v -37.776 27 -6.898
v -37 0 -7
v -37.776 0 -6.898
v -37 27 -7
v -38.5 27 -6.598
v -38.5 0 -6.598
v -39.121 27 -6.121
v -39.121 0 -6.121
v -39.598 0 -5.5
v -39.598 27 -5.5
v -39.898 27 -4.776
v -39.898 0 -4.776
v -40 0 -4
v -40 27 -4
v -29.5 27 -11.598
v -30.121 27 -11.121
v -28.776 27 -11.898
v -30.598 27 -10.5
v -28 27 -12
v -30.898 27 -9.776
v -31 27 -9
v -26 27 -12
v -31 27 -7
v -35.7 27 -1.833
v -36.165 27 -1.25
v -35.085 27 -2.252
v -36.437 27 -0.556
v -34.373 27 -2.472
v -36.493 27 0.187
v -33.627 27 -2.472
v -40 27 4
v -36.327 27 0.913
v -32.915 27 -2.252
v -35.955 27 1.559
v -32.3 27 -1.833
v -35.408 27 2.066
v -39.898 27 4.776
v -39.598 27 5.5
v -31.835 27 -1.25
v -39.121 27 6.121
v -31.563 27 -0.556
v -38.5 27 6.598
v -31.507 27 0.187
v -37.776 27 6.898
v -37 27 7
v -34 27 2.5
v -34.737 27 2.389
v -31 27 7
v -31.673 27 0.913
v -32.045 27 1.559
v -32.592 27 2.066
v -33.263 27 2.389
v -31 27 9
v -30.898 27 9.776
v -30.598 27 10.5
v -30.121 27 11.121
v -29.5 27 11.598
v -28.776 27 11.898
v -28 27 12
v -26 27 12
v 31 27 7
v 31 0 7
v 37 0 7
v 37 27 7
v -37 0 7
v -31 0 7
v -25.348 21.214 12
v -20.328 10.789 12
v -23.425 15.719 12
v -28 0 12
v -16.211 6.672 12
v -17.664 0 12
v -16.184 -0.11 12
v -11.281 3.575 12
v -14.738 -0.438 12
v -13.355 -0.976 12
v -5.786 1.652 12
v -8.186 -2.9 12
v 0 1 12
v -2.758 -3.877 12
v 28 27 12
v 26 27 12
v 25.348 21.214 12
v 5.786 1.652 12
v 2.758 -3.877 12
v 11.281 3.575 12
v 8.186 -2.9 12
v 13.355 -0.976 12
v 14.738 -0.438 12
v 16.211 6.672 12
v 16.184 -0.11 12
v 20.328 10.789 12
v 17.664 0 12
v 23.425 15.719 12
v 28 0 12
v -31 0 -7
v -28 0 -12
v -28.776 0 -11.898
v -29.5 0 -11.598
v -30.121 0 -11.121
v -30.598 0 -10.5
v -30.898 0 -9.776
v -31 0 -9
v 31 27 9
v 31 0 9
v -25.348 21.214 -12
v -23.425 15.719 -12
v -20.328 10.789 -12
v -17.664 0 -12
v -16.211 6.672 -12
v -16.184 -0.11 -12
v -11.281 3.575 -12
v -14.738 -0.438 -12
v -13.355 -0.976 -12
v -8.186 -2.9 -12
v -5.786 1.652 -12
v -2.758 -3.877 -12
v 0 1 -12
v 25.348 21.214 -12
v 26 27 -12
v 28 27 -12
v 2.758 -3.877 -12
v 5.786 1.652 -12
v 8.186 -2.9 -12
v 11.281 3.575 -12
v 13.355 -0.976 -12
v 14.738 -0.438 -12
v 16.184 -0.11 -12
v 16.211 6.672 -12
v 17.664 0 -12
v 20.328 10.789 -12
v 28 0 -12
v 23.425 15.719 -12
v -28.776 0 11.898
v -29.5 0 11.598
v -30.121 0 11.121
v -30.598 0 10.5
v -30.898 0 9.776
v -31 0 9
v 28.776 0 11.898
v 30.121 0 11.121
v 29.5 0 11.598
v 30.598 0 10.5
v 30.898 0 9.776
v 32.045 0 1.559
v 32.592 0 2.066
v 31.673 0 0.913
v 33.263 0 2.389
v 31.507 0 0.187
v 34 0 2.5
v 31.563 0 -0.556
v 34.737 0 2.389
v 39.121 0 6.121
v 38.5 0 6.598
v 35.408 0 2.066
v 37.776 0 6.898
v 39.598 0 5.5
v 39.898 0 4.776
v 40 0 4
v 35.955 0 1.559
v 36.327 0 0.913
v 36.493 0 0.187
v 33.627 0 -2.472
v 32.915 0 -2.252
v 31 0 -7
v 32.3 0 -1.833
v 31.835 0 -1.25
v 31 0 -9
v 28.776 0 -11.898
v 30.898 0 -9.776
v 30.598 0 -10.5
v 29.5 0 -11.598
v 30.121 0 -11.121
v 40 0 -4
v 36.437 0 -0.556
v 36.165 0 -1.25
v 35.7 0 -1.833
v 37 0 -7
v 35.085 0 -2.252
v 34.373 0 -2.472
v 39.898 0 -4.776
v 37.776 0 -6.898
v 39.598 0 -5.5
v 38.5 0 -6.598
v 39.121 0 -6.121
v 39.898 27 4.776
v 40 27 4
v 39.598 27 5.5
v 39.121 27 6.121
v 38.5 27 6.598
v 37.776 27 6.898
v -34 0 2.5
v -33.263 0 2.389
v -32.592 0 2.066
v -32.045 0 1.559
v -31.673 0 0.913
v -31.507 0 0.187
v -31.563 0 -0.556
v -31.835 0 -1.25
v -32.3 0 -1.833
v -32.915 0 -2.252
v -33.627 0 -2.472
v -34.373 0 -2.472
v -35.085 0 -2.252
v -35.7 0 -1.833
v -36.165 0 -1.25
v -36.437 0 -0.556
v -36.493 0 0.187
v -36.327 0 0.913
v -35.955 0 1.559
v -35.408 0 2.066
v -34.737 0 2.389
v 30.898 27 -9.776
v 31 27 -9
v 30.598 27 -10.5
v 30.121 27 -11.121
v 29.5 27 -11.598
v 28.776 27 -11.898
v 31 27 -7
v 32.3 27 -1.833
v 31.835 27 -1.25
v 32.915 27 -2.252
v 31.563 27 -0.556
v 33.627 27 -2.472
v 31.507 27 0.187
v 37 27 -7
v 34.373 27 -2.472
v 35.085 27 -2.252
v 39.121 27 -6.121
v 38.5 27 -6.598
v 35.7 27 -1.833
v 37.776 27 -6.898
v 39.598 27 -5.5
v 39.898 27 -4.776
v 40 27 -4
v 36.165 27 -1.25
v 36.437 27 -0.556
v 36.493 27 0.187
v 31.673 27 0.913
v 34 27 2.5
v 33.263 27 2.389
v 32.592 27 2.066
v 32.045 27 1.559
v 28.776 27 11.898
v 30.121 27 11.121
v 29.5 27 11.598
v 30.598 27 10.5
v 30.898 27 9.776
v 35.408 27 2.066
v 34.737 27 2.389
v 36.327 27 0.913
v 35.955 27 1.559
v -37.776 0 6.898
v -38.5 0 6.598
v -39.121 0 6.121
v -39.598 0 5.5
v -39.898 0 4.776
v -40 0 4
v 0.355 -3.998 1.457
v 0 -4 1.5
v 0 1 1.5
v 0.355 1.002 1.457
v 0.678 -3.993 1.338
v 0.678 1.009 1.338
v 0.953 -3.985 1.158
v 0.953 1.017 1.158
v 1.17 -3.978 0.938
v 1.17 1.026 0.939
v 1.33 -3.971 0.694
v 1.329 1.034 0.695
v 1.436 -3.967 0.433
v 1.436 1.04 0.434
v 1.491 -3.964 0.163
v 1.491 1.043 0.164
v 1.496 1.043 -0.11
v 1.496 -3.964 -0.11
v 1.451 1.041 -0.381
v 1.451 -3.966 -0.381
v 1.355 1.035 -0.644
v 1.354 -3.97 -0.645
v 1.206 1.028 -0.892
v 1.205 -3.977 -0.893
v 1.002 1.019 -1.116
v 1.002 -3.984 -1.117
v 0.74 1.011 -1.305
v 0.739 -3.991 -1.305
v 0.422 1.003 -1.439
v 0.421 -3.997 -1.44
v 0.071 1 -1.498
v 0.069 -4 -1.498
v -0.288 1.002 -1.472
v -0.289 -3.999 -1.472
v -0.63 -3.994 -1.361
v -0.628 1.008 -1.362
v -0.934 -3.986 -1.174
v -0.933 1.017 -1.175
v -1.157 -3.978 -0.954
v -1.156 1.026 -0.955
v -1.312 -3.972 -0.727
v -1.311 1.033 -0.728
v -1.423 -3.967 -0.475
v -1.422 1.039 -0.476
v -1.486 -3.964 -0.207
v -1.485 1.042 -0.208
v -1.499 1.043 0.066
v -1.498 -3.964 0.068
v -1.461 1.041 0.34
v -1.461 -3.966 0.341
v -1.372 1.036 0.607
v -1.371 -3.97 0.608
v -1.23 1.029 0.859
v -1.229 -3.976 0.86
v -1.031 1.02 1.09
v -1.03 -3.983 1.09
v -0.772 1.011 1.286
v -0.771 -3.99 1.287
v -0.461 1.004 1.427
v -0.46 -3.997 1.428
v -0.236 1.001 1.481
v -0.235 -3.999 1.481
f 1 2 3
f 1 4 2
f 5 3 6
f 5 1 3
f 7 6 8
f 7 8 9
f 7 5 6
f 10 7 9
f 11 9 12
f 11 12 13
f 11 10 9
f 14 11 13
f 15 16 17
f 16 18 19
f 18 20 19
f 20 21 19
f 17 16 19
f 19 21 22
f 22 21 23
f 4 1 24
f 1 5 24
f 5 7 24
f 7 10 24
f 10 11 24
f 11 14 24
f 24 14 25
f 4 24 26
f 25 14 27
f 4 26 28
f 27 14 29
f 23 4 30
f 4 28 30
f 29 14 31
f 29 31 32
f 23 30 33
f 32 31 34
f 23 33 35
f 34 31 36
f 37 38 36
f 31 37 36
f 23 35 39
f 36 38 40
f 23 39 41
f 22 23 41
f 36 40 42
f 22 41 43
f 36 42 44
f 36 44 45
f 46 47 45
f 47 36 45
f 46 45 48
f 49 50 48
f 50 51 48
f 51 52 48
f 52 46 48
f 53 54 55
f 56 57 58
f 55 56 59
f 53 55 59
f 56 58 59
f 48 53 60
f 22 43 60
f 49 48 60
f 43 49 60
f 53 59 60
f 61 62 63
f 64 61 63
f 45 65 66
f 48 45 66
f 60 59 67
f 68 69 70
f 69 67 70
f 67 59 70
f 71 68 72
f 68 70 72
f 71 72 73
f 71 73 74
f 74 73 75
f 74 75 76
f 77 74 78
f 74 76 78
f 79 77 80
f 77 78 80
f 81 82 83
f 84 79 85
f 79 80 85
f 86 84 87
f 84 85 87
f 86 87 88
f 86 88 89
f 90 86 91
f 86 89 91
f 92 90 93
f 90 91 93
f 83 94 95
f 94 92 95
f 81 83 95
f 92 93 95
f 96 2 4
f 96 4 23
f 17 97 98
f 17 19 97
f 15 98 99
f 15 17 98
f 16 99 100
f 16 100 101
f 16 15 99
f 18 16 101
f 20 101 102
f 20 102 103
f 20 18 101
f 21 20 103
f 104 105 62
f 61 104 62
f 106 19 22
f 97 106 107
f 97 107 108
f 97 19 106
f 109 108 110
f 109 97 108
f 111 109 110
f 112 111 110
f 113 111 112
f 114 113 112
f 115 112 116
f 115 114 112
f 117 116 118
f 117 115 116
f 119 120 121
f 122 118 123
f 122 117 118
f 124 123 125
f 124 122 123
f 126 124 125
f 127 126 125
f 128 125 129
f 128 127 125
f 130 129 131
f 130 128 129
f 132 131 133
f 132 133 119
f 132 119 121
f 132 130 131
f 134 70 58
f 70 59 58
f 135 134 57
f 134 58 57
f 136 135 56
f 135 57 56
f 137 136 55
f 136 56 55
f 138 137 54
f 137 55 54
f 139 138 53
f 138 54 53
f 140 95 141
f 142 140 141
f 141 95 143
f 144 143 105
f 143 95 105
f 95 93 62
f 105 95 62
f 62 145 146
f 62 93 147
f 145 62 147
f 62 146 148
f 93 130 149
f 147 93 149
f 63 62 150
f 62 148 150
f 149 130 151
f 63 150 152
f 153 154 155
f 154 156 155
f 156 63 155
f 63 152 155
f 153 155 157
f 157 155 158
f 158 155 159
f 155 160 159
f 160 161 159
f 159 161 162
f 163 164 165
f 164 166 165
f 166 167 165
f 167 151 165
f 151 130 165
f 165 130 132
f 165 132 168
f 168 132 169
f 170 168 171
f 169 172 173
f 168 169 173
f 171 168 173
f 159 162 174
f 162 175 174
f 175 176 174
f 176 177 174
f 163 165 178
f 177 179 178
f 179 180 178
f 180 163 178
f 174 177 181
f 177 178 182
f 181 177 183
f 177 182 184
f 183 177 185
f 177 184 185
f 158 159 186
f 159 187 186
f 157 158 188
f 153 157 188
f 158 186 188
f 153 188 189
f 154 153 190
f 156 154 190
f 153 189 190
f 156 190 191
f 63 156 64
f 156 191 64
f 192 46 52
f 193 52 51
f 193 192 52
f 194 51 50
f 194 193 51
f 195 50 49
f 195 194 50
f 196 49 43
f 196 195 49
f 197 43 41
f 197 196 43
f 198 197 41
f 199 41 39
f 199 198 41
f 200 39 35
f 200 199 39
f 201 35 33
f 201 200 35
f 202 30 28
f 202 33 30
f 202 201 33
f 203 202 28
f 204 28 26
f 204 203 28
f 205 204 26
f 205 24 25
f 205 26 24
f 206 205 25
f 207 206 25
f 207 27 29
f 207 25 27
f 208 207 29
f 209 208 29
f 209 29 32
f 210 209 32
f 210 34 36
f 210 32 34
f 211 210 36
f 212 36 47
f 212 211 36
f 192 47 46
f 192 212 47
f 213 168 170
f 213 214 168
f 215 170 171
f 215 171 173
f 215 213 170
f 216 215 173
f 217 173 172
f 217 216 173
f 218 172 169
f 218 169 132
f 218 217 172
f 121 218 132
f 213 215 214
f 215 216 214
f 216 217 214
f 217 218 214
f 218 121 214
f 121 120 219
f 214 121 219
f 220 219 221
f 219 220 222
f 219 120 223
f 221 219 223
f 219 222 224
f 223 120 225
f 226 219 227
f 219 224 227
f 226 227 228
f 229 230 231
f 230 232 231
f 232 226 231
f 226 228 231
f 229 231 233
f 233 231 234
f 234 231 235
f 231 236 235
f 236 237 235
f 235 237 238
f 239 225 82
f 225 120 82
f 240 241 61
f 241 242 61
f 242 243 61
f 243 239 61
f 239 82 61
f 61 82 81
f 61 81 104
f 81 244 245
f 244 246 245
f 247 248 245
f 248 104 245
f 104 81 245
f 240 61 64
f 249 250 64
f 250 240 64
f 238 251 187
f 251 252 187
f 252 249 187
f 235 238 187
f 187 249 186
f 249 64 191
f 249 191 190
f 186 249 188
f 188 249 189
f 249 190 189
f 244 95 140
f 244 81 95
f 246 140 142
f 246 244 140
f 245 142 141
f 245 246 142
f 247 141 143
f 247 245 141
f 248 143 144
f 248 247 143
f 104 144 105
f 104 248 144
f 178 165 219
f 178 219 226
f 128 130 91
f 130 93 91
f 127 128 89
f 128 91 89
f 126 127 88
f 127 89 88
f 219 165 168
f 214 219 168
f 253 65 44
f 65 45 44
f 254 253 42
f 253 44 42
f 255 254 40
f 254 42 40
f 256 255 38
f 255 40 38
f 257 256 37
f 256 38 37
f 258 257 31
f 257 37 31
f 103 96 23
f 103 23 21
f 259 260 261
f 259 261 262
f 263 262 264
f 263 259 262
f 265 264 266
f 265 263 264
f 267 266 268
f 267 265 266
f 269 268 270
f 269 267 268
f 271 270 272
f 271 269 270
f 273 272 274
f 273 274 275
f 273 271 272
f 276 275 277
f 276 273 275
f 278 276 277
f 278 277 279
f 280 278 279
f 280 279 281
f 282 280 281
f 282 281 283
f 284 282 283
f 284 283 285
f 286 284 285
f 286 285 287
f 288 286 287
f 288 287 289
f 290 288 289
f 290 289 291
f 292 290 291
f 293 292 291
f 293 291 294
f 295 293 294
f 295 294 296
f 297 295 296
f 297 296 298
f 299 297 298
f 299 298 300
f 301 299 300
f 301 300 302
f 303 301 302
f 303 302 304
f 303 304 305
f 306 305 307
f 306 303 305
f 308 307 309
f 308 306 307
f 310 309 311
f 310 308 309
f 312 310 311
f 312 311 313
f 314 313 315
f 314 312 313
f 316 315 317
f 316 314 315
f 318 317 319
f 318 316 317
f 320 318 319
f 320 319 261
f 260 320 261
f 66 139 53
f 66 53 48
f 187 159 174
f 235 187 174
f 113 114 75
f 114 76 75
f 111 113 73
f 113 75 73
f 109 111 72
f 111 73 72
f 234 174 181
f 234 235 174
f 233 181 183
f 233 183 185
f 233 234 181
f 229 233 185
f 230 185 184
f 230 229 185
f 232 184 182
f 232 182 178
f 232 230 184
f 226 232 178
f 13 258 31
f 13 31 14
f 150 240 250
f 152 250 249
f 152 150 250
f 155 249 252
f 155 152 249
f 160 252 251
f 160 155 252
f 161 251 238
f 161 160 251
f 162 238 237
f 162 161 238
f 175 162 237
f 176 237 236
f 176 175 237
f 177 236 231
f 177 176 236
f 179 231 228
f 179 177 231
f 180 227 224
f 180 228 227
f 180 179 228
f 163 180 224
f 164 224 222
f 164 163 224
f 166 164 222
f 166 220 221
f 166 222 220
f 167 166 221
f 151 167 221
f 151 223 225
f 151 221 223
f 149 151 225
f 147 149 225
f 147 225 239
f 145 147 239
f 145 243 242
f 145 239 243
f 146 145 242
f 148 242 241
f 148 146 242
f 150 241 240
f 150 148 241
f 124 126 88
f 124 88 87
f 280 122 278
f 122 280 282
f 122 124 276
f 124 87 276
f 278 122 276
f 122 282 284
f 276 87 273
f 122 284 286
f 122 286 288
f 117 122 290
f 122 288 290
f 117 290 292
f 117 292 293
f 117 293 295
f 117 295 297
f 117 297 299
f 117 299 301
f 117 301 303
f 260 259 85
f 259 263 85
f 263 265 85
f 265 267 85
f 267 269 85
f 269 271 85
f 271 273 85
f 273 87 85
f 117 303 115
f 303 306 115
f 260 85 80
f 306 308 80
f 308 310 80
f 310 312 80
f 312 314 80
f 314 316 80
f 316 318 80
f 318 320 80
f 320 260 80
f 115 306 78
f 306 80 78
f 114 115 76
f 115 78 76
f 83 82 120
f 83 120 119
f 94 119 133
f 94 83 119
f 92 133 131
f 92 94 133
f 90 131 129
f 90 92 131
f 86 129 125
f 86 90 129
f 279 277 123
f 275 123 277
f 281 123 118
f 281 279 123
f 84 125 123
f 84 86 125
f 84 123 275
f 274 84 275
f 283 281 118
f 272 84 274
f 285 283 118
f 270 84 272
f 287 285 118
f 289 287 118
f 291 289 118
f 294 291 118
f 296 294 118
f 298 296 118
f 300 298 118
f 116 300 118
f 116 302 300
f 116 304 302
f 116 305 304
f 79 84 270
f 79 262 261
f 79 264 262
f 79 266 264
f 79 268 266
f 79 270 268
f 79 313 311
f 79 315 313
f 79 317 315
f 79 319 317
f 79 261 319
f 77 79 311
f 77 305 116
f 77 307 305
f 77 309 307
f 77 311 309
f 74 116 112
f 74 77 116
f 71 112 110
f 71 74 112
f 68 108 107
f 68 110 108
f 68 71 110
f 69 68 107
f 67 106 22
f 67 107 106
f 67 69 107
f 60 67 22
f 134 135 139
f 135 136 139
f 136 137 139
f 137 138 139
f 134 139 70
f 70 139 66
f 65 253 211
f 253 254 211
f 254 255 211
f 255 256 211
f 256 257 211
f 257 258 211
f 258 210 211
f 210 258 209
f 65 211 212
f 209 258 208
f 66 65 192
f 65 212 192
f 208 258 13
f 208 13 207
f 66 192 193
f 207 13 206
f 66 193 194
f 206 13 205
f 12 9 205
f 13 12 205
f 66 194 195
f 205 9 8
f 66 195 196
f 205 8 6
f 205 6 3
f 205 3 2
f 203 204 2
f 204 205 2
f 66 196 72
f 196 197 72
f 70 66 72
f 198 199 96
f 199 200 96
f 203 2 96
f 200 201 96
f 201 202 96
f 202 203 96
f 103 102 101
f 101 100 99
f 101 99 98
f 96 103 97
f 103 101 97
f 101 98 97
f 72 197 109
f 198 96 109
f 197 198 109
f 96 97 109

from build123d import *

# Parameters (mm, degrees)
SKETCH_1_W               = 80
SKETCH_1_H               = 24
EXTRUDE_1_DEPTH          = 27
EXTRUDE_3_DEPTH          = 24
CUT_EXTRUDE_1_DEPTH      = 54.898051913
CUT_EXTRUDE_3_DEPTH      = 50.729267037
CUT_EXTRUDE_3_DEPTH_BACK = 50.729267037
SKETCH_4_R               = 1.5
CUT_EXTRUDE_4_DEPTH      = 50.729267115
CUT_EXTRUDE_4_DEPTH_BACK = 50.729267115
SKETCH_5_W               = 9
SKETCH_5_H               = 5
SKETCH_6_W               = 9
SKETCH_6_H               = 5
CUT_EXTRUDE_7_DEPTH      = 50.729267115
SKETCH_7_W               = 9
SKETCH_7_H               = 5
CUT_EXTRUDE_8_DEPTH      = 50.729267115
SKETCH_8_W               = 9
SKETCH_8_H               = 5
CUT_EXTRUDE_9_DEPTH      = 50.729267115
SKETCH_9_R               = 2.5
CUT_EXTRUDE_12_DEPTH     = 50.729267115
SKETCH_11_R              = 2.5
CUT_EXTRUDE_13_DEPTH     = 50.729267115
FILLET_1_R               = 3
FILLET_2_R               = 10


with BuildPart() as part:
    # 草图1 → 凸台-拉伸1 (new body)
    with BuildSketch(Plane(origin=(0, 0, 0), x_dir=(1, 0, 0), z_dir=(0, 1, 0))):
        Rectangle(SKETCH_1_W, SKETCH_1_H)
    extrude(amount=EXTRUDE_1_DEPTH)

    # 草图2 → 凸台-拉伸3 (add, through all)
    with BuildSketch(Plane.XY.offset(12)):
        with BuildLine():
            Line((-31, 27), (31, 27))
            ThreePointArc((31, 27), (0, -4), (-31, 27))
        make_face()
    extrude(amount=-EXTRUDE_3_DEPTH)

    # 草图3 → 切除-拉伸1 (cut, through all)
    with BuildSketch(Plane.XY.offset(12)):
        with BuildLine():
            Line((-26, 27), (26, 27))
            ThreePointArc((26, 27), (0, 1), (-26, 27))
        make_face()
    extrude(amount=-CUT_EXTRUDE_1_DEPTH, mode=Mode.SUBTRACT)

    # 草图4 → 切除-拉伸3 (cut, two sides: drawn at the far end of the back side and taken through both)
    with BuildSketch(Plane(origin=(0, 0, 0), x_dir=(1, 0, 0), z_dir=(0, 1, 0)).offset(-CUT_EXTRUDE_3_DEPTH_BACK)):
        with Locations(Location((0, 0, 0), (0, 0, 270))):
            Circle(SKETCH_4_R)
    extrude(amount=CUT_EXTRUDE_3_DEPTH + CUT_EXTRUDE_3_DEPTH_BACK, mode=Mode.SUBTRACT)

    # 草图5 → 切除-拉伸4 (cut, two sides: drawn at the far end of the back side and taken through both)
    with BuildSketch(Plane(origin=(0, 0, 0), x_dir=(1, 0, 0), z_dir=(0, 1, 0)).offset(-CUT_EXTRUDE_4_DEPTH_BACK)):
        with Locations((-35.5, 9.5)):
            Rectangle(SKETCH_5_W, SKETCH_5_H)
    extrude(amount=CUT_EXTRUDE_4_DEPTH + CUT_EXTRUDE_4_DEPTH_BACK, mode=Mode.SUBTRACT)

    # 草图6 → 切除-拉伸7 (cut, through all)
    with BuildSketch(Plane(origin=(0, 0, 0), x_dir=(1, 0, 0), z_dir=(0, 1, 0))):
        with Locations((-35.5, -9.5)):
            Rectangle(SKETCH_6_W, SKETCH_6_H)
    extrude(amount=CUT_EXTRUDE_7_DEPTH, mode=Mode.SUBTRACT)

    # 草图7 → 切除-拉伸8 (cut, through all)
    with BuildSketch(Plane(origin=(0, 0, 0), x_dir=(1, 0, 0), z_dir=(0, 1, 0))):
        with Locations((35.5, 9.5)):
            Rectangle(SKETCH_7_W, SKETCH_7_H)
    extrude(amount=CUT_EXTRUDE_8_DEPTH, mode=Mode.SUBTRACT)

    # 草图8 → 切除-拉伸9 (cut, through all)
    with BuildSketch(Plane(origin=(0, 0, 0), x_dir=(1, 0, 0), z_dir=(0, 1, 0))):
        with Locations((35.5, -9.5)):
            Rectangle(SKETCH_8_W, SKETCH_8_H)
    extrude(amount=CUT_EXTRUDE_9_DEPTH, mode=Mode.SUBTRACT)

    # 草图9 → 切除-拉伸12 (cut, through all)
    with BuildSketch(Plane(origin=(0, 0, 0), x_dir=(1, 0, 0), z_dir=(0, 1, 0))):
        with Locations(Location((-34, 0, 0), (0, 0, 270))):
            Circle(SKETCH_9_R)
    extrude(amount=CUT_EXTRUDE_12_DEPTH, mode=Mode.SUBTRACT)

    # 草图11 → 切除-拉伸13 (cut, through all)
    with BuildSketch(Plane(origin=(0, 0, 0), x_dir=(1, 0, 0), z_dir=(0, 1, 0))):
        with Locations(Location((34, 0, 0), (0, 0, 270))):
            Circle(SKETCH_11_R)
    extrude(amount=CUT_EXTRUDE_13_DEPTH, mode=Mode.SUBTRACT)

    # 圆角1
    fillet_1_edges = [part.edges().sort_by_distance(p)[0] for p in [
        (40, 13.5, 7),
        (31, 13.5, 12),
        (-40, 13.5, -7),
        (-31, 13.5, -12),
        (-40, 13.5, 7),
        (-31, 13.5, 12),
        (40, 13.5, -7),
        (31, 13.5, -12),
    ]]
    fillet(fillet_1_edges, radius=FILLET_1_R)

    # 圆角2
    fillet_2_edges = [part.edges().sort_by_distance(p)[0] for p in [
        (-15.231546212, 0, 0),
        (15.231546212, 0, 0),
    ]]
    fillet(fillet_2_edges, radius=FILLET_2_R)


solid = part.part
